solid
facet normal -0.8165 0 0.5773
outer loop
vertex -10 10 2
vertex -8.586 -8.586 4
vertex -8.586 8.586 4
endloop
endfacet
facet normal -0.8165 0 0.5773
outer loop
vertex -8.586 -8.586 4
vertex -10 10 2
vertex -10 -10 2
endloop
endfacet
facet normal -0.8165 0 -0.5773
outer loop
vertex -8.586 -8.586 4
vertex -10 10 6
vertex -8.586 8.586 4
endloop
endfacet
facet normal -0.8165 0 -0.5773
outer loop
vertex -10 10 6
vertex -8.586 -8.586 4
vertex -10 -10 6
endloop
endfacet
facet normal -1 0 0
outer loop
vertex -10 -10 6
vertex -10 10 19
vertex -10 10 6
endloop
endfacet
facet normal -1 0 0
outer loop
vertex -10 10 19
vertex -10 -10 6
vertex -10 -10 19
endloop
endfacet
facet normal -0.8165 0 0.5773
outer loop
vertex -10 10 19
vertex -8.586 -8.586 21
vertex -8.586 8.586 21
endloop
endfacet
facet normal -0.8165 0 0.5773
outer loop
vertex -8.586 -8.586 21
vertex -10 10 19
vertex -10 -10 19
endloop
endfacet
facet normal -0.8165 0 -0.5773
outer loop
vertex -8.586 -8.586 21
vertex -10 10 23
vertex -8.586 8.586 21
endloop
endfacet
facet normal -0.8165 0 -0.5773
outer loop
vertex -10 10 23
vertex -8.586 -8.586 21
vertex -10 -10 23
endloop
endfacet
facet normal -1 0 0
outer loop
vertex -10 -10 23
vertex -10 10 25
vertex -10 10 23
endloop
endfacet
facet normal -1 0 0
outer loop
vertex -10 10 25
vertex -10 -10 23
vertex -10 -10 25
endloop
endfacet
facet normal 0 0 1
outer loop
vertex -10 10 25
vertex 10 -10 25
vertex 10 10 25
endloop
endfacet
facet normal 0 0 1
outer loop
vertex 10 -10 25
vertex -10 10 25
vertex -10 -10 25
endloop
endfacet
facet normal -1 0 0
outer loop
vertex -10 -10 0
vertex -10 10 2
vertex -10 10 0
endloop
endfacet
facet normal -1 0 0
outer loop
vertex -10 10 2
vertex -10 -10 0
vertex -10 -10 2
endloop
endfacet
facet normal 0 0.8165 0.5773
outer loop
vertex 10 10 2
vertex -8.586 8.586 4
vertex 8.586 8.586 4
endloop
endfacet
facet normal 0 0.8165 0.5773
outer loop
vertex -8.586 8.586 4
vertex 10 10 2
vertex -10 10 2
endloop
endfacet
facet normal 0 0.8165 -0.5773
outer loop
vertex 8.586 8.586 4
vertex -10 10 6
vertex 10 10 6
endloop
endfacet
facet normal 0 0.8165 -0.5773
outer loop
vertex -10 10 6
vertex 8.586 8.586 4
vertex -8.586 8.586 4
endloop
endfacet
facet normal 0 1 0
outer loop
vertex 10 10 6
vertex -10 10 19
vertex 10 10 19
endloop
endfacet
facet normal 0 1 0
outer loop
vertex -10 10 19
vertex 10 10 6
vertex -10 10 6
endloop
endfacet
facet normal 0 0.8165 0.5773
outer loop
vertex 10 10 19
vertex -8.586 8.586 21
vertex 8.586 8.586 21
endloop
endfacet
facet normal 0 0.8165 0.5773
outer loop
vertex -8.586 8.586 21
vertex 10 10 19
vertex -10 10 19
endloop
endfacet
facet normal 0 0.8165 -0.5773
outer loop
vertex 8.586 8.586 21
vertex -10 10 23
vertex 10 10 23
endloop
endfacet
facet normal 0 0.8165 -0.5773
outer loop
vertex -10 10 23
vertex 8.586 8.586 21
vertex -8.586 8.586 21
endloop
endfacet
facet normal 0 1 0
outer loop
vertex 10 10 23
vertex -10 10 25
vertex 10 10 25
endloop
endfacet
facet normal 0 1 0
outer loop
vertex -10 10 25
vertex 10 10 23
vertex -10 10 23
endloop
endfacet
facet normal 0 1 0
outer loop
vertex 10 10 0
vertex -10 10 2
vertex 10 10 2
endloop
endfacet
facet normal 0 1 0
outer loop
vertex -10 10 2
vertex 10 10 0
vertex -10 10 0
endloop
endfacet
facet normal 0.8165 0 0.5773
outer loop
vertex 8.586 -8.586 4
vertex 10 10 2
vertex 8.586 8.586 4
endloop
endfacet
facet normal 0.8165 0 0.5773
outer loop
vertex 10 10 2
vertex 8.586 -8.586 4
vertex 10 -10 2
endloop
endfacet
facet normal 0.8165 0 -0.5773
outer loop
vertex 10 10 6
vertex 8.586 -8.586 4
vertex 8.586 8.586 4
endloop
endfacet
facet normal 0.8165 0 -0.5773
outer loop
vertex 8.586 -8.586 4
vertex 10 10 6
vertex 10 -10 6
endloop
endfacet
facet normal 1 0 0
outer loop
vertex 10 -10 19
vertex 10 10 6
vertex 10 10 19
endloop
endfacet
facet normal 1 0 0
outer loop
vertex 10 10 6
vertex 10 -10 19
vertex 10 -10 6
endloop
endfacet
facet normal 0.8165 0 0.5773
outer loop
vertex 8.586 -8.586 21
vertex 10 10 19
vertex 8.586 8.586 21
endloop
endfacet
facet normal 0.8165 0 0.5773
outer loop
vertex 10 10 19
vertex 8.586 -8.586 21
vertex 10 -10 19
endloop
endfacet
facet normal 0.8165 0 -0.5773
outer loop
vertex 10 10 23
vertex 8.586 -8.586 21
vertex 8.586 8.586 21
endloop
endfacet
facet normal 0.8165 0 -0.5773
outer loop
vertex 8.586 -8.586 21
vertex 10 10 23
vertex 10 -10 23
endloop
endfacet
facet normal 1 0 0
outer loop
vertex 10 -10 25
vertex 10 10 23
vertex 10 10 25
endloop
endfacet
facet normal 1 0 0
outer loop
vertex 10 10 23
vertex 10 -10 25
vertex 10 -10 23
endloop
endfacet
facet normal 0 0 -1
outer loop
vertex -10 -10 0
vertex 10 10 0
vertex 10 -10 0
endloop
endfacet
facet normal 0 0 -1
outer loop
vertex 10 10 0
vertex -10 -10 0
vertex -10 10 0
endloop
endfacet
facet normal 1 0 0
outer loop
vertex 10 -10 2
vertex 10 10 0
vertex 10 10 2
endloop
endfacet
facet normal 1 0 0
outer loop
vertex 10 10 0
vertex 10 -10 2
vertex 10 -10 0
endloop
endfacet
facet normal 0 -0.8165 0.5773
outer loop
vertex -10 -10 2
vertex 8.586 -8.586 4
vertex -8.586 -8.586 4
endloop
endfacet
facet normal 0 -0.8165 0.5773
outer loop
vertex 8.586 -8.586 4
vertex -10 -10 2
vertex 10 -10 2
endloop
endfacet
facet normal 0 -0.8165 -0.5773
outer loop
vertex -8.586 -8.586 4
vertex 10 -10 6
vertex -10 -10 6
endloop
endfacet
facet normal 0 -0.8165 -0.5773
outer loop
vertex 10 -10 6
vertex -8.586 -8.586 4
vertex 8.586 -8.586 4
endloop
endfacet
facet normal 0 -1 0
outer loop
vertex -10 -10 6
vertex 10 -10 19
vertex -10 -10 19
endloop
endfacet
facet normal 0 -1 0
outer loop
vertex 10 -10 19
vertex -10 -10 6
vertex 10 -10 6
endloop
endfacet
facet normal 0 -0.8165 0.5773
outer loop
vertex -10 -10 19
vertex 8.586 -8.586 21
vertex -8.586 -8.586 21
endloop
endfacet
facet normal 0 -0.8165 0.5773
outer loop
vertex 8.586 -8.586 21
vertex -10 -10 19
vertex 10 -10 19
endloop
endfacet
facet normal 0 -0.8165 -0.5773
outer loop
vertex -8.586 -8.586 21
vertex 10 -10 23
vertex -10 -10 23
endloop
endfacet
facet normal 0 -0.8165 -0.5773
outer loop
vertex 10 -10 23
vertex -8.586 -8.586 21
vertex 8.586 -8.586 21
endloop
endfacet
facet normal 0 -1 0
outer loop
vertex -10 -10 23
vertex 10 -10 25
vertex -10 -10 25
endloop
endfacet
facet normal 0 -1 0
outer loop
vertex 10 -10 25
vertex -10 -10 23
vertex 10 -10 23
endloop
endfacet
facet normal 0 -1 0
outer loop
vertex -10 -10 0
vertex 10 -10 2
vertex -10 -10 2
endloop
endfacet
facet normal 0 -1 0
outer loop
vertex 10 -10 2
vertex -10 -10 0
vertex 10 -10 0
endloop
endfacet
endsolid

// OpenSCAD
H=25;
L=20*sqrt(2);
l=4/sqrt(2);

module bloco(){
	rotate(45)
	rotate_extrude($fn=4)
	difference(){
		square([L/2,H]);

		translate([L/2,l*sqrt(2)])
		rotate(45) square([l,l], center=true);
	
		translate([L/2,H-l*sqrt(2)])
		rotate(45) square([l,l], center=true);
	}
}

module camada(nome, e, p=1){
		for (i=[0:3]){
			rotate(i*90)
			translate([-7.5,10+e-p,5])
			rotate([90,0])
			linear_extrude(height=e)
			import("rat.dxf", layer=nome);
		}
}

union(){
	difference(){
		bloco();
		camada("cabeca", 1, p=1-0.1);
	}
	camada("olhos", 0.5+0.5);
	camada("boca", 1);
	camada("boca2", 1.5);
	camada("bigode", 0.5+1);
	camada("focinho", 2+0.5);
	camada("dente", 2);
}
